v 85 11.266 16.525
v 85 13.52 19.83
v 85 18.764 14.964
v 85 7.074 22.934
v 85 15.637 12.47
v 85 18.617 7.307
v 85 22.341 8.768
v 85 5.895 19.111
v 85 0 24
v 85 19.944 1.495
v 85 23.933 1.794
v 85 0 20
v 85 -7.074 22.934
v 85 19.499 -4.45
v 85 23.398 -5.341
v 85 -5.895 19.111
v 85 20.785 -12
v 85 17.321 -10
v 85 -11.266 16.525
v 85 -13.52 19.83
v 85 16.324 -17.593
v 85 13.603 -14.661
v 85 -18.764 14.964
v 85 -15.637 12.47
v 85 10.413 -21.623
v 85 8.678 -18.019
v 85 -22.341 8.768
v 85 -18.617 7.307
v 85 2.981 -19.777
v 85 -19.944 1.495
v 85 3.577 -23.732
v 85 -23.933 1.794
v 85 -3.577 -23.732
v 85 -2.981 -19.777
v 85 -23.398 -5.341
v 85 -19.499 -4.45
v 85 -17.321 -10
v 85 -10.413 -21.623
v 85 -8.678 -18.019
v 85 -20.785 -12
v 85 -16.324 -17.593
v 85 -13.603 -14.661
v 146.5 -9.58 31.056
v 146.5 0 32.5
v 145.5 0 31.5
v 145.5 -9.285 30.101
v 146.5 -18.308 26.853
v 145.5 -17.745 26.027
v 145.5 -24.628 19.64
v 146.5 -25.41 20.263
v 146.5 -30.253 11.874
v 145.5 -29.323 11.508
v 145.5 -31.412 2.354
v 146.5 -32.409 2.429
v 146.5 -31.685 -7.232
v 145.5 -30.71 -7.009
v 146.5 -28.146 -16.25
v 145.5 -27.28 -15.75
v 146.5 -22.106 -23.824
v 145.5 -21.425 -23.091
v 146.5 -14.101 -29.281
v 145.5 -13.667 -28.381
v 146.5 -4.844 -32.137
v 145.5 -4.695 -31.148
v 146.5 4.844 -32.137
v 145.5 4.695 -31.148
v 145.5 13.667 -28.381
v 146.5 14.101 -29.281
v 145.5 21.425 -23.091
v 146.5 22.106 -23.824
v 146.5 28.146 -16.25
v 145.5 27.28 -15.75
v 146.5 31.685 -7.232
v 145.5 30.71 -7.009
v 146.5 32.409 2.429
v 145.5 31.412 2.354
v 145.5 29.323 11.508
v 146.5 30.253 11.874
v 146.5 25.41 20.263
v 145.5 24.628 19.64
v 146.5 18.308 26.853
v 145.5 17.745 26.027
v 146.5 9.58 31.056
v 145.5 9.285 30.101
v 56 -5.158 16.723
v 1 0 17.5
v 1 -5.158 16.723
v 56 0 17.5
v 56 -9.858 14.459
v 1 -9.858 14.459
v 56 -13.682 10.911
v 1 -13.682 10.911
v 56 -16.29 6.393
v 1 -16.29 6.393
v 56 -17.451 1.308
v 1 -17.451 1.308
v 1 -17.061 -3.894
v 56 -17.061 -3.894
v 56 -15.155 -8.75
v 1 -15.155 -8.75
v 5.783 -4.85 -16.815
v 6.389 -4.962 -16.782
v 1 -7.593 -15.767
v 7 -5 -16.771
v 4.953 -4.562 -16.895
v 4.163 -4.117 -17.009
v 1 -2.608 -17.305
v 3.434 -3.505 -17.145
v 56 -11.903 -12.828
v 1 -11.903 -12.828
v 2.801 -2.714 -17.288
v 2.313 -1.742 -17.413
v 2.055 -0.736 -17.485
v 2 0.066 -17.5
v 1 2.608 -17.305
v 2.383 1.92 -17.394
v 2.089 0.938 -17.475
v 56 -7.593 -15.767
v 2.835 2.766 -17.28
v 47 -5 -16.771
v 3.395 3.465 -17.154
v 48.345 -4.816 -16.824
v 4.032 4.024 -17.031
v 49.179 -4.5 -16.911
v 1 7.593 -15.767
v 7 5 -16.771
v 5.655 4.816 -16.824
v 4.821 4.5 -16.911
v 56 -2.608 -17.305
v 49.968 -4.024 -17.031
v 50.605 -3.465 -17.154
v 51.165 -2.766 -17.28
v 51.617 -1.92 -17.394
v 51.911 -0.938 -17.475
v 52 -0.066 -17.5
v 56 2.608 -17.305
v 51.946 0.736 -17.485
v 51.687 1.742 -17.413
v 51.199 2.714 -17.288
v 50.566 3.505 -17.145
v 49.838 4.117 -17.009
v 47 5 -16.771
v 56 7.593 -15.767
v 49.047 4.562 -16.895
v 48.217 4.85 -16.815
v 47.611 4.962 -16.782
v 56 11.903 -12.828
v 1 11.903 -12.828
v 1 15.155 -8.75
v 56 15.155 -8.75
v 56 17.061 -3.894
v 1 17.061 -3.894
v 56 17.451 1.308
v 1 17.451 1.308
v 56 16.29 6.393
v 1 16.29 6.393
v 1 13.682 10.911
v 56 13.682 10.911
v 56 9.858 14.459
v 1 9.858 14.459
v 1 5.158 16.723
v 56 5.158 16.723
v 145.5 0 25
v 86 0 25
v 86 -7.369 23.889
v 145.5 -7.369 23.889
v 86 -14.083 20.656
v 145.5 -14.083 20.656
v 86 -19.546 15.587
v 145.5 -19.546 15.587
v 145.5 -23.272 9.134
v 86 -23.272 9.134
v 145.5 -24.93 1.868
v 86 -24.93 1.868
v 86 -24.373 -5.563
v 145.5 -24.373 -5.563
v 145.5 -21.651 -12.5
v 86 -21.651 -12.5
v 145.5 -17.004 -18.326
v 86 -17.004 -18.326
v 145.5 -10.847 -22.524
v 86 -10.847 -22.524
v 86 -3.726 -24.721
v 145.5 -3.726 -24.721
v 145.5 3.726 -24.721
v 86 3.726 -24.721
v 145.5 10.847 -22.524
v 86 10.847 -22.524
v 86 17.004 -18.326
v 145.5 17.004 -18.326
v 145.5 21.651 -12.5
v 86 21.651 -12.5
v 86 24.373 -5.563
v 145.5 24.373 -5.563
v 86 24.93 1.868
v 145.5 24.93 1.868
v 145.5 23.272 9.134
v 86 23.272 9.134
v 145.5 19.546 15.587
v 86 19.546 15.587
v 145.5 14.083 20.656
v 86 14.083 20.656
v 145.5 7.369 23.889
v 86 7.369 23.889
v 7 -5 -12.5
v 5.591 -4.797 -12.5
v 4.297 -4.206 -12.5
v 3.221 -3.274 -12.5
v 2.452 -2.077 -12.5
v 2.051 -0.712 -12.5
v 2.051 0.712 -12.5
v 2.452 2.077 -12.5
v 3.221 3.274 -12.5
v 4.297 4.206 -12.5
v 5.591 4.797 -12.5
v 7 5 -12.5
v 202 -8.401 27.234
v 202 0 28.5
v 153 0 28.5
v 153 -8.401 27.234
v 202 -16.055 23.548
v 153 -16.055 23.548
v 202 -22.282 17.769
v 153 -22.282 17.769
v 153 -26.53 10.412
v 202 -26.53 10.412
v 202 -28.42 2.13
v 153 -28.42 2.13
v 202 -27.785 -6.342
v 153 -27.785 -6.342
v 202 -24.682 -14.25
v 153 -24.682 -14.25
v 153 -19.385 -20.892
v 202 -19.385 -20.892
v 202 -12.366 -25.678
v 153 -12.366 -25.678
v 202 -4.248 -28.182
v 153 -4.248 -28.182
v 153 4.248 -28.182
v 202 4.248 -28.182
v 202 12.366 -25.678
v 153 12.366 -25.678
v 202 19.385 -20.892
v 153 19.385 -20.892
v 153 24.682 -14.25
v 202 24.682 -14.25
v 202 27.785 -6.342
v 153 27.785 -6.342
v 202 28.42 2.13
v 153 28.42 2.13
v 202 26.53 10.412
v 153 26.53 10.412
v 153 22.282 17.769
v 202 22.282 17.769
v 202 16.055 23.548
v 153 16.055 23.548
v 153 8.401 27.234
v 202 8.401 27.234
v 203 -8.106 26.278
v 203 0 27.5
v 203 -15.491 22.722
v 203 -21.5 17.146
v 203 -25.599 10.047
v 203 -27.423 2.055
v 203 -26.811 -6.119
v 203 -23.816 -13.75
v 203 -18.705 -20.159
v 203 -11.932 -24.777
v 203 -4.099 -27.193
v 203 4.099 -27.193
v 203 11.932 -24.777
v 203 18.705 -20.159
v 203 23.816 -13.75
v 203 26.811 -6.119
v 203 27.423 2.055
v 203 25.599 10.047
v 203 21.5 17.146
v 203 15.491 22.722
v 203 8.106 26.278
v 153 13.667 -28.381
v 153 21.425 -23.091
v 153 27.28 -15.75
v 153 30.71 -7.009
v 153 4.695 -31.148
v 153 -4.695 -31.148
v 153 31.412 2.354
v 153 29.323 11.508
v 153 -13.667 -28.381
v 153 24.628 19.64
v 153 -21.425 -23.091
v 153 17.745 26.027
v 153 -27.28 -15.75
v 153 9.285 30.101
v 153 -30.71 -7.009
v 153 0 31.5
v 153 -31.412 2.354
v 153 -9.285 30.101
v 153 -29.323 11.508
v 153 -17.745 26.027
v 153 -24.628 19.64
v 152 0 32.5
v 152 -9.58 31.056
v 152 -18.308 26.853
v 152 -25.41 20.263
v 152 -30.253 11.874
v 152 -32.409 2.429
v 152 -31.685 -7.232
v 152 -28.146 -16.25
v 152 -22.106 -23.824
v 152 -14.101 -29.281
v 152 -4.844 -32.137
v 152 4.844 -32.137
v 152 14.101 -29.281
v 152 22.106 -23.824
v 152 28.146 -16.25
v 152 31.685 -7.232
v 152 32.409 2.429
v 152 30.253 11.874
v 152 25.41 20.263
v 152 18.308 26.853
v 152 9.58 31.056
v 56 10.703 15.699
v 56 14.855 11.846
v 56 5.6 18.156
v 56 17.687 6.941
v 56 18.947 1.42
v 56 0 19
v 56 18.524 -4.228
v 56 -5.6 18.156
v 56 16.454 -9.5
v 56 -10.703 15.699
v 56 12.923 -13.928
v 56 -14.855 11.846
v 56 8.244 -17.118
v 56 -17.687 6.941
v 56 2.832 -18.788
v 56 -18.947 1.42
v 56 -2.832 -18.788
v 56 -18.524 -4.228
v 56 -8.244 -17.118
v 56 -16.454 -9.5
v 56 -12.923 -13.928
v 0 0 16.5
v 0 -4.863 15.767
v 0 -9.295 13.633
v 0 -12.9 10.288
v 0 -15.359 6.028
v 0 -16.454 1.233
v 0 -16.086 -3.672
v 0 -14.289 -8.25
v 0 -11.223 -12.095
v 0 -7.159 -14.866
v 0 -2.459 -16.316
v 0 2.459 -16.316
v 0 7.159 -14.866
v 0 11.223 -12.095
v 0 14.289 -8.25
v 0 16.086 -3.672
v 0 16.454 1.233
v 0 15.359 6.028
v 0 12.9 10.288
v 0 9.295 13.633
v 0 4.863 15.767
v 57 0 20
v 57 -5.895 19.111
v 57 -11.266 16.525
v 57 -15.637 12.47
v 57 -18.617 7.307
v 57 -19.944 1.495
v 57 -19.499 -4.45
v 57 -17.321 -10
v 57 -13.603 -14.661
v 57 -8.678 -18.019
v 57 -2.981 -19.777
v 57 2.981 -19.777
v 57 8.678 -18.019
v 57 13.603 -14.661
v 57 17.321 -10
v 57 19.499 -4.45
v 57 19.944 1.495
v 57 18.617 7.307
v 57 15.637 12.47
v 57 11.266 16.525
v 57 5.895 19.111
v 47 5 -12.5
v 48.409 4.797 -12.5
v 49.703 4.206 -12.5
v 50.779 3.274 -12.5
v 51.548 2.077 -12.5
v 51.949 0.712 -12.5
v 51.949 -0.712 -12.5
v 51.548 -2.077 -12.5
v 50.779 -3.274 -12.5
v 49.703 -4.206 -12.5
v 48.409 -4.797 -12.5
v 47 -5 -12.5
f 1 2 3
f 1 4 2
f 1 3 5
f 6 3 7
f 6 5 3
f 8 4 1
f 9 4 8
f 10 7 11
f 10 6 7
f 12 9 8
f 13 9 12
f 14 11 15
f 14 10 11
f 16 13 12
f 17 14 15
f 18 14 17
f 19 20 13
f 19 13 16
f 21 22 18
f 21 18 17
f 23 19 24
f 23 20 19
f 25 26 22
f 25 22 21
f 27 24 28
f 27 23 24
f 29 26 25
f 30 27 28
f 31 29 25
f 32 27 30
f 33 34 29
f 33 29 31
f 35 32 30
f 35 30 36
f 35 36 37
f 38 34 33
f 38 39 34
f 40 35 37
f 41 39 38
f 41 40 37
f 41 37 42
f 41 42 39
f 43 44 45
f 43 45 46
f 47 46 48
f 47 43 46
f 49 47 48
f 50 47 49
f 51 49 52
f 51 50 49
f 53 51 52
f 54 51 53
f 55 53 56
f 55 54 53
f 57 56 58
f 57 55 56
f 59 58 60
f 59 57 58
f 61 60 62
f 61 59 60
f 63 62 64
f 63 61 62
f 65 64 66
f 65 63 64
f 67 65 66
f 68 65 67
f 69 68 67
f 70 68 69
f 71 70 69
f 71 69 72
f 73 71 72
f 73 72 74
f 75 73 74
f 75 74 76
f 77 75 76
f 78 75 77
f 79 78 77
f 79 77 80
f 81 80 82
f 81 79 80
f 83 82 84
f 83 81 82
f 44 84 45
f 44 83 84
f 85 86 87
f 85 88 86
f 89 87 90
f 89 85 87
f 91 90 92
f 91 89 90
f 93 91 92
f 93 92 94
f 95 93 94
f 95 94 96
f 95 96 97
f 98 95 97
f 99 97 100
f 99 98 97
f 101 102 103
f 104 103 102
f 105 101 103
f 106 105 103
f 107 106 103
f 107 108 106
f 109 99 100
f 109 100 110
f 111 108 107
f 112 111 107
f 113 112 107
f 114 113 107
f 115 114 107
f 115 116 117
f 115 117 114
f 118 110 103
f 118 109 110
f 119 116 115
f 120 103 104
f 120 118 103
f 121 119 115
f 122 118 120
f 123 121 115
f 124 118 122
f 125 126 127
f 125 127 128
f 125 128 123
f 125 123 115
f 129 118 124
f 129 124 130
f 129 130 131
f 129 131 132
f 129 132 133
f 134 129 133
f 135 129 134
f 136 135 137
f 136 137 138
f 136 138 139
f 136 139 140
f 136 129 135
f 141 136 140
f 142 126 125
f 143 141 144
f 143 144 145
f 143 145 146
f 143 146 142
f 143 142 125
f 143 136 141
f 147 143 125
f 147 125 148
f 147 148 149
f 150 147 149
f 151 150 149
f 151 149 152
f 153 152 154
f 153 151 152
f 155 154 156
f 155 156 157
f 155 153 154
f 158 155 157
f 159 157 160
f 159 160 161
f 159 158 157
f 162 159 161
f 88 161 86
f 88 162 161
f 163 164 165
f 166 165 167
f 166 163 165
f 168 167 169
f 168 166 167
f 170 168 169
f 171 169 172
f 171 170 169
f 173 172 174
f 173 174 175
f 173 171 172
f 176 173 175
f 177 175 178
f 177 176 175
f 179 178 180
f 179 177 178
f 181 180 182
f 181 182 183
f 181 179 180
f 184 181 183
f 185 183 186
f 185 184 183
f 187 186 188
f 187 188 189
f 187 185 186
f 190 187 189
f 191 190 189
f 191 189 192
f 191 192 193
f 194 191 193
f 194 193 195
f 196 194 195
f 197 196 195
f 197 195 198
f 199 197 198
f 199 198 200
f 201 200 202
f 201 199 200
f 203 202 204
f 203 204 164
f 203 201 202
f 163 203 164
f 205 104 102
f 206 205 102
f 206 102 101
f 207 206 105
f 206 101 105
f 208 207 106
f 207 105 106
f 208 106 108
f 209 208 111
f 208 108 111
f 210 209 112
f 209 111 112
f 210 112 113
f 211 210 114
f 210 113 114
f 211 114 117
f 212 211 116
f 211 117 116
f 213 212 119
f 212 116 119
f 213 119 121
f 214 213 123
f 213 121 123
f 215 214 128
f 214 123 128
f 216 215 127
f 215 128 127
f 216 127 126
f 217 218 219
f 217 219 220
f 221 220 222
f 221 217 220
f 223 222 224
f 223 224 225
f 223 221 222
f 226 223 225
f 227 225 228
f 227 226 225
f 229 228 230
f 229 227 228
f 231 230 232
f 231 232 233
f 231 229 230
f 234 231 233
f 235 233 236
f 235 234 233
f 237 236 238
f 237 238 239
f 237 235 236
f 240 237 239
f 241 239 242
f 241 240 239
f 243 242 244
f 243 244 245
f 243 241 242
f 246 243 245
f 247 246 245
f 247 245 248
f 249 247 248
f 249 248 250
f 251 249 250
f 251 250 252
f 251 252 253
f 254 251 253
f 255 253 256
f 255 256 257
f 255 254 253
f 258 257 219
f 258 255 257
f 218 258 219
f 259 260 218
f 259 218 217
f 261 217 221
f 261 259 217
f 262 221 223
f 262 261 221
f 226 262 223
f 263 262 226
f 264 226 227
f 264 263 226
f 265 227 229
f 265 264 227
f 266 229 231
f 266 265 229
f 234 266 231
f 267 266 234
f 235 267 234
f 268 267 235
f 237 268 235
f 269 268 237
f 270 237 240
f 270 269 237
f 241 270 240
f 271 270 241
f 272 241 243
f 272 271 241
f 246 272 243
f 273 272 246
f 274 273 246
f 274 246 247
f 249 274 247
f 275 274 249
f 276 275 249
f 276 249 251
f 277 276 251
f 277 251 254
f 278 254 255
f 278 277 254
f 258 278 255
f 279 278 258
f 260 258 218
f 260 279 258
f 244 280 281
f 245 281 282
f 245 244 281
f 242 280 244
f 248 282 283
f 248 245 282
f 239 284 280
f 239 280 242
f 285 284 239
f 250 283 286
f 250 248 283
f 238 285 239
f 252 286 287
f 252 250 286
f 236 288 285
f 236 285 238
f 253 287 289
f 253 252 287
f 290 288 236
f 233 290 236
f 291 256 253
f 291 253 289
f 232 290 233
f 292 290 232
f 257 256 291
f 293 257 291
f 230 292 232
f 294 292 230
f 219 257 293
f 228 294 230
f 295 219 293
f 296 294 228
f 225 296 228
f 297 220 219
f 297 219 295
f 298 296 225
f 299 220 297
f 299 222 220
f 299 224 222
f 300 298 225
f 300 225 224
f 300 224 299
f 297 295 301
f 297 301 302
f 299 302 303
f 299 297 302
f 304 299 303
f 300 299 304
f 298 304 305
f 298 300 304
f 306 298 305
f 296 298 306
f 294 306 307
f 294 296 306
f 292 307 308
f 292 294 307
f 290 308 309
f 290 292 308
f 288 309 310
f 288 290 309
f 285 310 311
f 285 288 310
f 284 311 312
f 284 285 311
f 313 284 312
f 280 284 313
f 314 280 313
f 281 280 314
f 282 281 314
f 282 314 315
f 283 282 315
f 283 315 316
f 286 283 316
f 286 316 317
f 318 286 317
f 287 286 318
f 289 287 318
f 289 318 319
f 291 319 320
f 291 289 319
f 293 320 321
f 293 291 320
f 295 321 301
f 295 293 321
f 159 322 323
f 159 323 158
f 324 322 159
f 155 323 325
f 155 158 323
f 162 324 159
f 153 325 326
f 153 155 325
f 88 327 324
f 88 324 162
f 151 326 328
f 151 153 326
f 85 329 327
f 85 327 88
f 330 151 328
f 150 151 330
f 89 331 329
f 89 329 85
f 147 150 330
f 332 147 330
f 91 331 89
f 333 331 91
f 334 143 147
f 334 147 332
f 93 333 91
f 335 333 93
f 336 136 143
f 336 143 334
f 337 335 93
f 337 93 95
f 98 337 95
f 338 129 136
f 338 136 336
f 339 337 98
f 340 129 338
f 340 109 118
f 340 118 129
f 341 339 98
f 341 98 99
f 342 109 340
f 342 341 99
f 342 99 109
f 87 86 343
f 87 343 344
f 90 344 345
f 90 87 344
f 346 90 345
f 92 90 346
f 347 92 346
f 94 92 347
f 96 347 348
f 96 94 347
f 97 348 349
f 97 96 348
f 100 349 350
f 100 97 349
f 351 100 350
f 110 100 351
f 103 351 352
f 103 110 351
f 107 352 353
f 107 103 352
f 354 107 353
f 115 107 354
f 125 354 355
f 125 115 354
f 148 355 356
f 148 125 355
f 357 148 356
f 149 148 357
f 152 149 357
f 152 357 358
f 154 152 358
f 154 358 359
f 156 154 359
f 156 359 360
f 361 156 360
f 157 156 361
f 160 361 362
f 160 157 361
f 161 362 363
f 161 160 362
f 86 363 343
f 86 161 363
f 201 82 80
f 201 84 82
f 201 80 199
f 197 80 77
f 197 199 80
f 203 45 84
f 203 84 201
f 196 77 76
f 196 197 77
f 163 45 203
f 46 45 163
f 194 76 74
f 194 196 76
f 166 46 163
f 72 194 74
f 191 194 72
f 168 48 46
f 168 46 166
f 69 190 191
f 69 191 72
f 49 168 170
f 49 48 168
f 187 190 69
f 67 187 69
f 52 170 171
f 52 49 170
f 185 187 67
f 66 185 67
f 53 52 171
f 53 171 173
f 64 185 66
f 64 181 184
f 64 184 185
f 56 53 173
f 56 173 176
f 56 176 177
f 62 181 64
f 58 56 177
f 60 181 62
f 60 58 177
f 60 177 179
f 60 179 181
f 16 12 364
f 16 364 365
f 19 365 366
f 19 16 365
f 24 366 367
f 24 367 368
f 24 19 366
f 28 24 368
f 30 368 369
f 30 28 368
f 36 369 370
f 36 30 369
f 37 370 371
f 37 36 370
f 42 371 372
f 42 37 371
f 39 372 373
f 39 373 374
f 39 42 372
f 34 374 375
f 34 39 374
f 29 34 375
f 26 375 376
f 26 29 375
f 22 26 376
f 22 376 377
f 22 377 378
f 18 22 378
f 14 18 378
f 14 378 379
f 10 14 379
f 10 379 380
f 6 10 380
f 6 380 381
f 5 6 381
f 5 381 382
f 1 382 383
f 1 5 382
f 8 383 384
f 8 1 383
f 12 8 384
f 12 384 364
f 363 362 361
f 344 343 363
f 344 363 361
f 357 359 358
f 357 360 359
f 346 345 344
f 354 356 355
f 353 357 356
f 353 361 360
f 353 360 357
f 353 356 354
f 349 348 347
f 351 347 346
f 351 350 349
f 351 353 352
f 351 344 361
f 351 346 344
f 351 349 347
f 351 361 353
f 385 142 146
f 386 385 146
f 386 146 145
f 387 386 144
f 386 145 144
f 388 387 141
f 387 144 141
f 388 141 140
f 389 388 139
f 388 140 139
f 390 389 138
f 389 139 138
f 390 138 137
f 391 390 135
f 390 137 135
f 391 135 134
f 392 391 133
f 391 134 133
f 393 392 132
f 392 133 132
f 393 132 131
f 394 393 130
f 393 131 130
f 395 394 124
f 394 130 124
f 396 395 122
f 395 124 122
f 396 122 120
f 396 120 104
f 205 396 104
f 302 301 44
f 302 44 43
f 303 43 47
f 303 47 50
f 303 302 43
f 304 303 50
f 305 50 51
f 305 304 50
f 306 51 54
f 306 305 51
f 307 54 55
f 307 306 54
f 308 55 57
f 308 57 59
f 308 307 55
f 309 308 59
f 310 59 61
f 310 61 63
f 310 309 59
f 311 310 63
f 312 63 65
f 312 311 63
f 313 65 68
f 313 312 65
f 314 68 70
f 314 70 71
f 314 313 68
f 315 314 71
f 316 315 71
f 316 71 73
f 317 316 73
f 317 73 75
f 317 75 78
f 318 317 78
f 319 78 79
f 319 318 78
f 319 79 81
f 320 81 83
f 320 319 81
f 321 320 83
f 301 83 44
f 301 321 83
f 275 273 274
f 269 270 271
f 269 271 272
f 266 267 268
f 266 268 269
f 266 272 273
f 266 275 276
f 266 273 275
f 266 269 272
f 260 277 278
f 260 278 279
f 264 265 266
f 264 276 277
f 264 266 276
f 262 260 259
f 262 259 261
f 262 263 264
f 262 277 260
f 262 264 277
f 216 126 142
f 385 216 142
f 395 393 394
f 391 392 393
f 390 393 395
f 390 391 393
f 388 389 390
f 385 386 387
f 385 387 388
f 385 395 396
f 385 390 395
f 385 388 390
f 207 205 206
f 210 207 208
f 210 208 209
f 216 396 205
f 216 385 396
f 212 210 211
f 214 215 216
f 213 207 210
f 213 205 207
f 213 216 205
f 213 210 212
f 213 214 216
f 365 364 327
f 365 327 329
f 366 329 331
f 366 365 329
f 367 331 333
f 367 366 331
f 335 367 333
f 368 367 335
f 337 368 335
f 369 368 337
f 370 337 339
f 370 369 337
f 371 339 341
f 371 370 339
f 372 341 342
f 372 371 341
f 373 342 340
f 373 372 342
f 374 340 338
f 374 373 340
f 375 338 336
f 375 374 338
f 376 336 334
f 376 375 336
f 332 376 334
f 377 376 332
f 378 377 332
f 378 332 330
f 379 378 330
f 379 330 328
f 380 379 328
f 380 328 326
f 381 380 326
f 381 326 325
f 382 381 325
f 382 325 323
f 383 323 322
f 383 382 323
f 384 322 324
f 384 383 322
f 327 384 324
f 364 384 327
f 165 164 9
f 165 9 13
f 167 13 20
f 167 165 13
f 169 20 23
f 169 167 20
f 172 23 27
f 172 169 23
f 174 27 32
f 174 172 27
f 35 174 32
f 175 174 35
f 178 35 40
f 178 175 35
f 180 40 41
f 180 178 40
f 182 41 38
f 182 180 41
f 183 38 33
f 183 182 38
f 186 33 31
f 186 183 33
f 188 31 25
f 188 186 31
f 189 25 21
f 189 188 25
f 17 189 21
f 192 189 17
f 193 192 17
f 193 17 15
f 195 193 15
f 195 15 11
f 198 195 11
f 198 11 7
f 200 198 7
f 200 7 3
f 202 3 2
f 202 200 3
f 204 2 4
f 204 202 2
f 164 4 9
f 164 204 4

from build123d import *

# Parameters (mm, degrees)
CHAMFER_1_SIZE      = 1
CUT_EXTRUDE_START   = -17.5
CUT_EXTRUDE_1_DEPTH = 5


with BuildPart() as part:
    # Эскиз1 → Повернуть1 (revolve)
    with BuildSketch(Plane.XY, mode=Mode.PRIVATE) as revolve_1_sk:
        Polygon((0, 0), (0, 17.5), (56, 17.5), (56, 20), (85, 20), (85, 25), (145.5, 25), (145.5, 32.5), (153, 32.5), (153, 28.5), (203, 28.5), (203, 0), align=None)
    revolve(revolve_1_sk.sketch.rotate(Axis((0, 0, 0), (1, 0, 0)), 90), axis=Axis((0, 0, 0), (1, 0, 0)))

    # Фаска1
    chamfer_1_edges = [part.edges().sort_by_distance(p)[0] for p in [
        (153, 0, -32.5),
        (145.5, 0, -32.5),
        (85, 0, -25),
        (56, 0, -20),
        (0, 0, -17.5),
        (203, 0, -28.5),
    ]]
    chamfer(chamfer_1_edges, length=CHAMFER_1_SIZE)

    # Эскиз2 → Вырез-Вытянуть1 (cut)
    with BuildSketch(Plane.XY.offset(CUT_EXTRUDE_START)):
        with BuildLine():
            Line((7, 5), (47, 5))
            ThreePointArc((47, 5), (52, 0), (47, -5))
            Line((47, -5), (7, -5))
            ThreePointArc((7, -5), (2, 0), (7, 5))
        make_face()
    extrude(amount=CUT_EXTRUDE_1_DEPTH, mode=Mode.SUBTRACT)


solid = part.part
